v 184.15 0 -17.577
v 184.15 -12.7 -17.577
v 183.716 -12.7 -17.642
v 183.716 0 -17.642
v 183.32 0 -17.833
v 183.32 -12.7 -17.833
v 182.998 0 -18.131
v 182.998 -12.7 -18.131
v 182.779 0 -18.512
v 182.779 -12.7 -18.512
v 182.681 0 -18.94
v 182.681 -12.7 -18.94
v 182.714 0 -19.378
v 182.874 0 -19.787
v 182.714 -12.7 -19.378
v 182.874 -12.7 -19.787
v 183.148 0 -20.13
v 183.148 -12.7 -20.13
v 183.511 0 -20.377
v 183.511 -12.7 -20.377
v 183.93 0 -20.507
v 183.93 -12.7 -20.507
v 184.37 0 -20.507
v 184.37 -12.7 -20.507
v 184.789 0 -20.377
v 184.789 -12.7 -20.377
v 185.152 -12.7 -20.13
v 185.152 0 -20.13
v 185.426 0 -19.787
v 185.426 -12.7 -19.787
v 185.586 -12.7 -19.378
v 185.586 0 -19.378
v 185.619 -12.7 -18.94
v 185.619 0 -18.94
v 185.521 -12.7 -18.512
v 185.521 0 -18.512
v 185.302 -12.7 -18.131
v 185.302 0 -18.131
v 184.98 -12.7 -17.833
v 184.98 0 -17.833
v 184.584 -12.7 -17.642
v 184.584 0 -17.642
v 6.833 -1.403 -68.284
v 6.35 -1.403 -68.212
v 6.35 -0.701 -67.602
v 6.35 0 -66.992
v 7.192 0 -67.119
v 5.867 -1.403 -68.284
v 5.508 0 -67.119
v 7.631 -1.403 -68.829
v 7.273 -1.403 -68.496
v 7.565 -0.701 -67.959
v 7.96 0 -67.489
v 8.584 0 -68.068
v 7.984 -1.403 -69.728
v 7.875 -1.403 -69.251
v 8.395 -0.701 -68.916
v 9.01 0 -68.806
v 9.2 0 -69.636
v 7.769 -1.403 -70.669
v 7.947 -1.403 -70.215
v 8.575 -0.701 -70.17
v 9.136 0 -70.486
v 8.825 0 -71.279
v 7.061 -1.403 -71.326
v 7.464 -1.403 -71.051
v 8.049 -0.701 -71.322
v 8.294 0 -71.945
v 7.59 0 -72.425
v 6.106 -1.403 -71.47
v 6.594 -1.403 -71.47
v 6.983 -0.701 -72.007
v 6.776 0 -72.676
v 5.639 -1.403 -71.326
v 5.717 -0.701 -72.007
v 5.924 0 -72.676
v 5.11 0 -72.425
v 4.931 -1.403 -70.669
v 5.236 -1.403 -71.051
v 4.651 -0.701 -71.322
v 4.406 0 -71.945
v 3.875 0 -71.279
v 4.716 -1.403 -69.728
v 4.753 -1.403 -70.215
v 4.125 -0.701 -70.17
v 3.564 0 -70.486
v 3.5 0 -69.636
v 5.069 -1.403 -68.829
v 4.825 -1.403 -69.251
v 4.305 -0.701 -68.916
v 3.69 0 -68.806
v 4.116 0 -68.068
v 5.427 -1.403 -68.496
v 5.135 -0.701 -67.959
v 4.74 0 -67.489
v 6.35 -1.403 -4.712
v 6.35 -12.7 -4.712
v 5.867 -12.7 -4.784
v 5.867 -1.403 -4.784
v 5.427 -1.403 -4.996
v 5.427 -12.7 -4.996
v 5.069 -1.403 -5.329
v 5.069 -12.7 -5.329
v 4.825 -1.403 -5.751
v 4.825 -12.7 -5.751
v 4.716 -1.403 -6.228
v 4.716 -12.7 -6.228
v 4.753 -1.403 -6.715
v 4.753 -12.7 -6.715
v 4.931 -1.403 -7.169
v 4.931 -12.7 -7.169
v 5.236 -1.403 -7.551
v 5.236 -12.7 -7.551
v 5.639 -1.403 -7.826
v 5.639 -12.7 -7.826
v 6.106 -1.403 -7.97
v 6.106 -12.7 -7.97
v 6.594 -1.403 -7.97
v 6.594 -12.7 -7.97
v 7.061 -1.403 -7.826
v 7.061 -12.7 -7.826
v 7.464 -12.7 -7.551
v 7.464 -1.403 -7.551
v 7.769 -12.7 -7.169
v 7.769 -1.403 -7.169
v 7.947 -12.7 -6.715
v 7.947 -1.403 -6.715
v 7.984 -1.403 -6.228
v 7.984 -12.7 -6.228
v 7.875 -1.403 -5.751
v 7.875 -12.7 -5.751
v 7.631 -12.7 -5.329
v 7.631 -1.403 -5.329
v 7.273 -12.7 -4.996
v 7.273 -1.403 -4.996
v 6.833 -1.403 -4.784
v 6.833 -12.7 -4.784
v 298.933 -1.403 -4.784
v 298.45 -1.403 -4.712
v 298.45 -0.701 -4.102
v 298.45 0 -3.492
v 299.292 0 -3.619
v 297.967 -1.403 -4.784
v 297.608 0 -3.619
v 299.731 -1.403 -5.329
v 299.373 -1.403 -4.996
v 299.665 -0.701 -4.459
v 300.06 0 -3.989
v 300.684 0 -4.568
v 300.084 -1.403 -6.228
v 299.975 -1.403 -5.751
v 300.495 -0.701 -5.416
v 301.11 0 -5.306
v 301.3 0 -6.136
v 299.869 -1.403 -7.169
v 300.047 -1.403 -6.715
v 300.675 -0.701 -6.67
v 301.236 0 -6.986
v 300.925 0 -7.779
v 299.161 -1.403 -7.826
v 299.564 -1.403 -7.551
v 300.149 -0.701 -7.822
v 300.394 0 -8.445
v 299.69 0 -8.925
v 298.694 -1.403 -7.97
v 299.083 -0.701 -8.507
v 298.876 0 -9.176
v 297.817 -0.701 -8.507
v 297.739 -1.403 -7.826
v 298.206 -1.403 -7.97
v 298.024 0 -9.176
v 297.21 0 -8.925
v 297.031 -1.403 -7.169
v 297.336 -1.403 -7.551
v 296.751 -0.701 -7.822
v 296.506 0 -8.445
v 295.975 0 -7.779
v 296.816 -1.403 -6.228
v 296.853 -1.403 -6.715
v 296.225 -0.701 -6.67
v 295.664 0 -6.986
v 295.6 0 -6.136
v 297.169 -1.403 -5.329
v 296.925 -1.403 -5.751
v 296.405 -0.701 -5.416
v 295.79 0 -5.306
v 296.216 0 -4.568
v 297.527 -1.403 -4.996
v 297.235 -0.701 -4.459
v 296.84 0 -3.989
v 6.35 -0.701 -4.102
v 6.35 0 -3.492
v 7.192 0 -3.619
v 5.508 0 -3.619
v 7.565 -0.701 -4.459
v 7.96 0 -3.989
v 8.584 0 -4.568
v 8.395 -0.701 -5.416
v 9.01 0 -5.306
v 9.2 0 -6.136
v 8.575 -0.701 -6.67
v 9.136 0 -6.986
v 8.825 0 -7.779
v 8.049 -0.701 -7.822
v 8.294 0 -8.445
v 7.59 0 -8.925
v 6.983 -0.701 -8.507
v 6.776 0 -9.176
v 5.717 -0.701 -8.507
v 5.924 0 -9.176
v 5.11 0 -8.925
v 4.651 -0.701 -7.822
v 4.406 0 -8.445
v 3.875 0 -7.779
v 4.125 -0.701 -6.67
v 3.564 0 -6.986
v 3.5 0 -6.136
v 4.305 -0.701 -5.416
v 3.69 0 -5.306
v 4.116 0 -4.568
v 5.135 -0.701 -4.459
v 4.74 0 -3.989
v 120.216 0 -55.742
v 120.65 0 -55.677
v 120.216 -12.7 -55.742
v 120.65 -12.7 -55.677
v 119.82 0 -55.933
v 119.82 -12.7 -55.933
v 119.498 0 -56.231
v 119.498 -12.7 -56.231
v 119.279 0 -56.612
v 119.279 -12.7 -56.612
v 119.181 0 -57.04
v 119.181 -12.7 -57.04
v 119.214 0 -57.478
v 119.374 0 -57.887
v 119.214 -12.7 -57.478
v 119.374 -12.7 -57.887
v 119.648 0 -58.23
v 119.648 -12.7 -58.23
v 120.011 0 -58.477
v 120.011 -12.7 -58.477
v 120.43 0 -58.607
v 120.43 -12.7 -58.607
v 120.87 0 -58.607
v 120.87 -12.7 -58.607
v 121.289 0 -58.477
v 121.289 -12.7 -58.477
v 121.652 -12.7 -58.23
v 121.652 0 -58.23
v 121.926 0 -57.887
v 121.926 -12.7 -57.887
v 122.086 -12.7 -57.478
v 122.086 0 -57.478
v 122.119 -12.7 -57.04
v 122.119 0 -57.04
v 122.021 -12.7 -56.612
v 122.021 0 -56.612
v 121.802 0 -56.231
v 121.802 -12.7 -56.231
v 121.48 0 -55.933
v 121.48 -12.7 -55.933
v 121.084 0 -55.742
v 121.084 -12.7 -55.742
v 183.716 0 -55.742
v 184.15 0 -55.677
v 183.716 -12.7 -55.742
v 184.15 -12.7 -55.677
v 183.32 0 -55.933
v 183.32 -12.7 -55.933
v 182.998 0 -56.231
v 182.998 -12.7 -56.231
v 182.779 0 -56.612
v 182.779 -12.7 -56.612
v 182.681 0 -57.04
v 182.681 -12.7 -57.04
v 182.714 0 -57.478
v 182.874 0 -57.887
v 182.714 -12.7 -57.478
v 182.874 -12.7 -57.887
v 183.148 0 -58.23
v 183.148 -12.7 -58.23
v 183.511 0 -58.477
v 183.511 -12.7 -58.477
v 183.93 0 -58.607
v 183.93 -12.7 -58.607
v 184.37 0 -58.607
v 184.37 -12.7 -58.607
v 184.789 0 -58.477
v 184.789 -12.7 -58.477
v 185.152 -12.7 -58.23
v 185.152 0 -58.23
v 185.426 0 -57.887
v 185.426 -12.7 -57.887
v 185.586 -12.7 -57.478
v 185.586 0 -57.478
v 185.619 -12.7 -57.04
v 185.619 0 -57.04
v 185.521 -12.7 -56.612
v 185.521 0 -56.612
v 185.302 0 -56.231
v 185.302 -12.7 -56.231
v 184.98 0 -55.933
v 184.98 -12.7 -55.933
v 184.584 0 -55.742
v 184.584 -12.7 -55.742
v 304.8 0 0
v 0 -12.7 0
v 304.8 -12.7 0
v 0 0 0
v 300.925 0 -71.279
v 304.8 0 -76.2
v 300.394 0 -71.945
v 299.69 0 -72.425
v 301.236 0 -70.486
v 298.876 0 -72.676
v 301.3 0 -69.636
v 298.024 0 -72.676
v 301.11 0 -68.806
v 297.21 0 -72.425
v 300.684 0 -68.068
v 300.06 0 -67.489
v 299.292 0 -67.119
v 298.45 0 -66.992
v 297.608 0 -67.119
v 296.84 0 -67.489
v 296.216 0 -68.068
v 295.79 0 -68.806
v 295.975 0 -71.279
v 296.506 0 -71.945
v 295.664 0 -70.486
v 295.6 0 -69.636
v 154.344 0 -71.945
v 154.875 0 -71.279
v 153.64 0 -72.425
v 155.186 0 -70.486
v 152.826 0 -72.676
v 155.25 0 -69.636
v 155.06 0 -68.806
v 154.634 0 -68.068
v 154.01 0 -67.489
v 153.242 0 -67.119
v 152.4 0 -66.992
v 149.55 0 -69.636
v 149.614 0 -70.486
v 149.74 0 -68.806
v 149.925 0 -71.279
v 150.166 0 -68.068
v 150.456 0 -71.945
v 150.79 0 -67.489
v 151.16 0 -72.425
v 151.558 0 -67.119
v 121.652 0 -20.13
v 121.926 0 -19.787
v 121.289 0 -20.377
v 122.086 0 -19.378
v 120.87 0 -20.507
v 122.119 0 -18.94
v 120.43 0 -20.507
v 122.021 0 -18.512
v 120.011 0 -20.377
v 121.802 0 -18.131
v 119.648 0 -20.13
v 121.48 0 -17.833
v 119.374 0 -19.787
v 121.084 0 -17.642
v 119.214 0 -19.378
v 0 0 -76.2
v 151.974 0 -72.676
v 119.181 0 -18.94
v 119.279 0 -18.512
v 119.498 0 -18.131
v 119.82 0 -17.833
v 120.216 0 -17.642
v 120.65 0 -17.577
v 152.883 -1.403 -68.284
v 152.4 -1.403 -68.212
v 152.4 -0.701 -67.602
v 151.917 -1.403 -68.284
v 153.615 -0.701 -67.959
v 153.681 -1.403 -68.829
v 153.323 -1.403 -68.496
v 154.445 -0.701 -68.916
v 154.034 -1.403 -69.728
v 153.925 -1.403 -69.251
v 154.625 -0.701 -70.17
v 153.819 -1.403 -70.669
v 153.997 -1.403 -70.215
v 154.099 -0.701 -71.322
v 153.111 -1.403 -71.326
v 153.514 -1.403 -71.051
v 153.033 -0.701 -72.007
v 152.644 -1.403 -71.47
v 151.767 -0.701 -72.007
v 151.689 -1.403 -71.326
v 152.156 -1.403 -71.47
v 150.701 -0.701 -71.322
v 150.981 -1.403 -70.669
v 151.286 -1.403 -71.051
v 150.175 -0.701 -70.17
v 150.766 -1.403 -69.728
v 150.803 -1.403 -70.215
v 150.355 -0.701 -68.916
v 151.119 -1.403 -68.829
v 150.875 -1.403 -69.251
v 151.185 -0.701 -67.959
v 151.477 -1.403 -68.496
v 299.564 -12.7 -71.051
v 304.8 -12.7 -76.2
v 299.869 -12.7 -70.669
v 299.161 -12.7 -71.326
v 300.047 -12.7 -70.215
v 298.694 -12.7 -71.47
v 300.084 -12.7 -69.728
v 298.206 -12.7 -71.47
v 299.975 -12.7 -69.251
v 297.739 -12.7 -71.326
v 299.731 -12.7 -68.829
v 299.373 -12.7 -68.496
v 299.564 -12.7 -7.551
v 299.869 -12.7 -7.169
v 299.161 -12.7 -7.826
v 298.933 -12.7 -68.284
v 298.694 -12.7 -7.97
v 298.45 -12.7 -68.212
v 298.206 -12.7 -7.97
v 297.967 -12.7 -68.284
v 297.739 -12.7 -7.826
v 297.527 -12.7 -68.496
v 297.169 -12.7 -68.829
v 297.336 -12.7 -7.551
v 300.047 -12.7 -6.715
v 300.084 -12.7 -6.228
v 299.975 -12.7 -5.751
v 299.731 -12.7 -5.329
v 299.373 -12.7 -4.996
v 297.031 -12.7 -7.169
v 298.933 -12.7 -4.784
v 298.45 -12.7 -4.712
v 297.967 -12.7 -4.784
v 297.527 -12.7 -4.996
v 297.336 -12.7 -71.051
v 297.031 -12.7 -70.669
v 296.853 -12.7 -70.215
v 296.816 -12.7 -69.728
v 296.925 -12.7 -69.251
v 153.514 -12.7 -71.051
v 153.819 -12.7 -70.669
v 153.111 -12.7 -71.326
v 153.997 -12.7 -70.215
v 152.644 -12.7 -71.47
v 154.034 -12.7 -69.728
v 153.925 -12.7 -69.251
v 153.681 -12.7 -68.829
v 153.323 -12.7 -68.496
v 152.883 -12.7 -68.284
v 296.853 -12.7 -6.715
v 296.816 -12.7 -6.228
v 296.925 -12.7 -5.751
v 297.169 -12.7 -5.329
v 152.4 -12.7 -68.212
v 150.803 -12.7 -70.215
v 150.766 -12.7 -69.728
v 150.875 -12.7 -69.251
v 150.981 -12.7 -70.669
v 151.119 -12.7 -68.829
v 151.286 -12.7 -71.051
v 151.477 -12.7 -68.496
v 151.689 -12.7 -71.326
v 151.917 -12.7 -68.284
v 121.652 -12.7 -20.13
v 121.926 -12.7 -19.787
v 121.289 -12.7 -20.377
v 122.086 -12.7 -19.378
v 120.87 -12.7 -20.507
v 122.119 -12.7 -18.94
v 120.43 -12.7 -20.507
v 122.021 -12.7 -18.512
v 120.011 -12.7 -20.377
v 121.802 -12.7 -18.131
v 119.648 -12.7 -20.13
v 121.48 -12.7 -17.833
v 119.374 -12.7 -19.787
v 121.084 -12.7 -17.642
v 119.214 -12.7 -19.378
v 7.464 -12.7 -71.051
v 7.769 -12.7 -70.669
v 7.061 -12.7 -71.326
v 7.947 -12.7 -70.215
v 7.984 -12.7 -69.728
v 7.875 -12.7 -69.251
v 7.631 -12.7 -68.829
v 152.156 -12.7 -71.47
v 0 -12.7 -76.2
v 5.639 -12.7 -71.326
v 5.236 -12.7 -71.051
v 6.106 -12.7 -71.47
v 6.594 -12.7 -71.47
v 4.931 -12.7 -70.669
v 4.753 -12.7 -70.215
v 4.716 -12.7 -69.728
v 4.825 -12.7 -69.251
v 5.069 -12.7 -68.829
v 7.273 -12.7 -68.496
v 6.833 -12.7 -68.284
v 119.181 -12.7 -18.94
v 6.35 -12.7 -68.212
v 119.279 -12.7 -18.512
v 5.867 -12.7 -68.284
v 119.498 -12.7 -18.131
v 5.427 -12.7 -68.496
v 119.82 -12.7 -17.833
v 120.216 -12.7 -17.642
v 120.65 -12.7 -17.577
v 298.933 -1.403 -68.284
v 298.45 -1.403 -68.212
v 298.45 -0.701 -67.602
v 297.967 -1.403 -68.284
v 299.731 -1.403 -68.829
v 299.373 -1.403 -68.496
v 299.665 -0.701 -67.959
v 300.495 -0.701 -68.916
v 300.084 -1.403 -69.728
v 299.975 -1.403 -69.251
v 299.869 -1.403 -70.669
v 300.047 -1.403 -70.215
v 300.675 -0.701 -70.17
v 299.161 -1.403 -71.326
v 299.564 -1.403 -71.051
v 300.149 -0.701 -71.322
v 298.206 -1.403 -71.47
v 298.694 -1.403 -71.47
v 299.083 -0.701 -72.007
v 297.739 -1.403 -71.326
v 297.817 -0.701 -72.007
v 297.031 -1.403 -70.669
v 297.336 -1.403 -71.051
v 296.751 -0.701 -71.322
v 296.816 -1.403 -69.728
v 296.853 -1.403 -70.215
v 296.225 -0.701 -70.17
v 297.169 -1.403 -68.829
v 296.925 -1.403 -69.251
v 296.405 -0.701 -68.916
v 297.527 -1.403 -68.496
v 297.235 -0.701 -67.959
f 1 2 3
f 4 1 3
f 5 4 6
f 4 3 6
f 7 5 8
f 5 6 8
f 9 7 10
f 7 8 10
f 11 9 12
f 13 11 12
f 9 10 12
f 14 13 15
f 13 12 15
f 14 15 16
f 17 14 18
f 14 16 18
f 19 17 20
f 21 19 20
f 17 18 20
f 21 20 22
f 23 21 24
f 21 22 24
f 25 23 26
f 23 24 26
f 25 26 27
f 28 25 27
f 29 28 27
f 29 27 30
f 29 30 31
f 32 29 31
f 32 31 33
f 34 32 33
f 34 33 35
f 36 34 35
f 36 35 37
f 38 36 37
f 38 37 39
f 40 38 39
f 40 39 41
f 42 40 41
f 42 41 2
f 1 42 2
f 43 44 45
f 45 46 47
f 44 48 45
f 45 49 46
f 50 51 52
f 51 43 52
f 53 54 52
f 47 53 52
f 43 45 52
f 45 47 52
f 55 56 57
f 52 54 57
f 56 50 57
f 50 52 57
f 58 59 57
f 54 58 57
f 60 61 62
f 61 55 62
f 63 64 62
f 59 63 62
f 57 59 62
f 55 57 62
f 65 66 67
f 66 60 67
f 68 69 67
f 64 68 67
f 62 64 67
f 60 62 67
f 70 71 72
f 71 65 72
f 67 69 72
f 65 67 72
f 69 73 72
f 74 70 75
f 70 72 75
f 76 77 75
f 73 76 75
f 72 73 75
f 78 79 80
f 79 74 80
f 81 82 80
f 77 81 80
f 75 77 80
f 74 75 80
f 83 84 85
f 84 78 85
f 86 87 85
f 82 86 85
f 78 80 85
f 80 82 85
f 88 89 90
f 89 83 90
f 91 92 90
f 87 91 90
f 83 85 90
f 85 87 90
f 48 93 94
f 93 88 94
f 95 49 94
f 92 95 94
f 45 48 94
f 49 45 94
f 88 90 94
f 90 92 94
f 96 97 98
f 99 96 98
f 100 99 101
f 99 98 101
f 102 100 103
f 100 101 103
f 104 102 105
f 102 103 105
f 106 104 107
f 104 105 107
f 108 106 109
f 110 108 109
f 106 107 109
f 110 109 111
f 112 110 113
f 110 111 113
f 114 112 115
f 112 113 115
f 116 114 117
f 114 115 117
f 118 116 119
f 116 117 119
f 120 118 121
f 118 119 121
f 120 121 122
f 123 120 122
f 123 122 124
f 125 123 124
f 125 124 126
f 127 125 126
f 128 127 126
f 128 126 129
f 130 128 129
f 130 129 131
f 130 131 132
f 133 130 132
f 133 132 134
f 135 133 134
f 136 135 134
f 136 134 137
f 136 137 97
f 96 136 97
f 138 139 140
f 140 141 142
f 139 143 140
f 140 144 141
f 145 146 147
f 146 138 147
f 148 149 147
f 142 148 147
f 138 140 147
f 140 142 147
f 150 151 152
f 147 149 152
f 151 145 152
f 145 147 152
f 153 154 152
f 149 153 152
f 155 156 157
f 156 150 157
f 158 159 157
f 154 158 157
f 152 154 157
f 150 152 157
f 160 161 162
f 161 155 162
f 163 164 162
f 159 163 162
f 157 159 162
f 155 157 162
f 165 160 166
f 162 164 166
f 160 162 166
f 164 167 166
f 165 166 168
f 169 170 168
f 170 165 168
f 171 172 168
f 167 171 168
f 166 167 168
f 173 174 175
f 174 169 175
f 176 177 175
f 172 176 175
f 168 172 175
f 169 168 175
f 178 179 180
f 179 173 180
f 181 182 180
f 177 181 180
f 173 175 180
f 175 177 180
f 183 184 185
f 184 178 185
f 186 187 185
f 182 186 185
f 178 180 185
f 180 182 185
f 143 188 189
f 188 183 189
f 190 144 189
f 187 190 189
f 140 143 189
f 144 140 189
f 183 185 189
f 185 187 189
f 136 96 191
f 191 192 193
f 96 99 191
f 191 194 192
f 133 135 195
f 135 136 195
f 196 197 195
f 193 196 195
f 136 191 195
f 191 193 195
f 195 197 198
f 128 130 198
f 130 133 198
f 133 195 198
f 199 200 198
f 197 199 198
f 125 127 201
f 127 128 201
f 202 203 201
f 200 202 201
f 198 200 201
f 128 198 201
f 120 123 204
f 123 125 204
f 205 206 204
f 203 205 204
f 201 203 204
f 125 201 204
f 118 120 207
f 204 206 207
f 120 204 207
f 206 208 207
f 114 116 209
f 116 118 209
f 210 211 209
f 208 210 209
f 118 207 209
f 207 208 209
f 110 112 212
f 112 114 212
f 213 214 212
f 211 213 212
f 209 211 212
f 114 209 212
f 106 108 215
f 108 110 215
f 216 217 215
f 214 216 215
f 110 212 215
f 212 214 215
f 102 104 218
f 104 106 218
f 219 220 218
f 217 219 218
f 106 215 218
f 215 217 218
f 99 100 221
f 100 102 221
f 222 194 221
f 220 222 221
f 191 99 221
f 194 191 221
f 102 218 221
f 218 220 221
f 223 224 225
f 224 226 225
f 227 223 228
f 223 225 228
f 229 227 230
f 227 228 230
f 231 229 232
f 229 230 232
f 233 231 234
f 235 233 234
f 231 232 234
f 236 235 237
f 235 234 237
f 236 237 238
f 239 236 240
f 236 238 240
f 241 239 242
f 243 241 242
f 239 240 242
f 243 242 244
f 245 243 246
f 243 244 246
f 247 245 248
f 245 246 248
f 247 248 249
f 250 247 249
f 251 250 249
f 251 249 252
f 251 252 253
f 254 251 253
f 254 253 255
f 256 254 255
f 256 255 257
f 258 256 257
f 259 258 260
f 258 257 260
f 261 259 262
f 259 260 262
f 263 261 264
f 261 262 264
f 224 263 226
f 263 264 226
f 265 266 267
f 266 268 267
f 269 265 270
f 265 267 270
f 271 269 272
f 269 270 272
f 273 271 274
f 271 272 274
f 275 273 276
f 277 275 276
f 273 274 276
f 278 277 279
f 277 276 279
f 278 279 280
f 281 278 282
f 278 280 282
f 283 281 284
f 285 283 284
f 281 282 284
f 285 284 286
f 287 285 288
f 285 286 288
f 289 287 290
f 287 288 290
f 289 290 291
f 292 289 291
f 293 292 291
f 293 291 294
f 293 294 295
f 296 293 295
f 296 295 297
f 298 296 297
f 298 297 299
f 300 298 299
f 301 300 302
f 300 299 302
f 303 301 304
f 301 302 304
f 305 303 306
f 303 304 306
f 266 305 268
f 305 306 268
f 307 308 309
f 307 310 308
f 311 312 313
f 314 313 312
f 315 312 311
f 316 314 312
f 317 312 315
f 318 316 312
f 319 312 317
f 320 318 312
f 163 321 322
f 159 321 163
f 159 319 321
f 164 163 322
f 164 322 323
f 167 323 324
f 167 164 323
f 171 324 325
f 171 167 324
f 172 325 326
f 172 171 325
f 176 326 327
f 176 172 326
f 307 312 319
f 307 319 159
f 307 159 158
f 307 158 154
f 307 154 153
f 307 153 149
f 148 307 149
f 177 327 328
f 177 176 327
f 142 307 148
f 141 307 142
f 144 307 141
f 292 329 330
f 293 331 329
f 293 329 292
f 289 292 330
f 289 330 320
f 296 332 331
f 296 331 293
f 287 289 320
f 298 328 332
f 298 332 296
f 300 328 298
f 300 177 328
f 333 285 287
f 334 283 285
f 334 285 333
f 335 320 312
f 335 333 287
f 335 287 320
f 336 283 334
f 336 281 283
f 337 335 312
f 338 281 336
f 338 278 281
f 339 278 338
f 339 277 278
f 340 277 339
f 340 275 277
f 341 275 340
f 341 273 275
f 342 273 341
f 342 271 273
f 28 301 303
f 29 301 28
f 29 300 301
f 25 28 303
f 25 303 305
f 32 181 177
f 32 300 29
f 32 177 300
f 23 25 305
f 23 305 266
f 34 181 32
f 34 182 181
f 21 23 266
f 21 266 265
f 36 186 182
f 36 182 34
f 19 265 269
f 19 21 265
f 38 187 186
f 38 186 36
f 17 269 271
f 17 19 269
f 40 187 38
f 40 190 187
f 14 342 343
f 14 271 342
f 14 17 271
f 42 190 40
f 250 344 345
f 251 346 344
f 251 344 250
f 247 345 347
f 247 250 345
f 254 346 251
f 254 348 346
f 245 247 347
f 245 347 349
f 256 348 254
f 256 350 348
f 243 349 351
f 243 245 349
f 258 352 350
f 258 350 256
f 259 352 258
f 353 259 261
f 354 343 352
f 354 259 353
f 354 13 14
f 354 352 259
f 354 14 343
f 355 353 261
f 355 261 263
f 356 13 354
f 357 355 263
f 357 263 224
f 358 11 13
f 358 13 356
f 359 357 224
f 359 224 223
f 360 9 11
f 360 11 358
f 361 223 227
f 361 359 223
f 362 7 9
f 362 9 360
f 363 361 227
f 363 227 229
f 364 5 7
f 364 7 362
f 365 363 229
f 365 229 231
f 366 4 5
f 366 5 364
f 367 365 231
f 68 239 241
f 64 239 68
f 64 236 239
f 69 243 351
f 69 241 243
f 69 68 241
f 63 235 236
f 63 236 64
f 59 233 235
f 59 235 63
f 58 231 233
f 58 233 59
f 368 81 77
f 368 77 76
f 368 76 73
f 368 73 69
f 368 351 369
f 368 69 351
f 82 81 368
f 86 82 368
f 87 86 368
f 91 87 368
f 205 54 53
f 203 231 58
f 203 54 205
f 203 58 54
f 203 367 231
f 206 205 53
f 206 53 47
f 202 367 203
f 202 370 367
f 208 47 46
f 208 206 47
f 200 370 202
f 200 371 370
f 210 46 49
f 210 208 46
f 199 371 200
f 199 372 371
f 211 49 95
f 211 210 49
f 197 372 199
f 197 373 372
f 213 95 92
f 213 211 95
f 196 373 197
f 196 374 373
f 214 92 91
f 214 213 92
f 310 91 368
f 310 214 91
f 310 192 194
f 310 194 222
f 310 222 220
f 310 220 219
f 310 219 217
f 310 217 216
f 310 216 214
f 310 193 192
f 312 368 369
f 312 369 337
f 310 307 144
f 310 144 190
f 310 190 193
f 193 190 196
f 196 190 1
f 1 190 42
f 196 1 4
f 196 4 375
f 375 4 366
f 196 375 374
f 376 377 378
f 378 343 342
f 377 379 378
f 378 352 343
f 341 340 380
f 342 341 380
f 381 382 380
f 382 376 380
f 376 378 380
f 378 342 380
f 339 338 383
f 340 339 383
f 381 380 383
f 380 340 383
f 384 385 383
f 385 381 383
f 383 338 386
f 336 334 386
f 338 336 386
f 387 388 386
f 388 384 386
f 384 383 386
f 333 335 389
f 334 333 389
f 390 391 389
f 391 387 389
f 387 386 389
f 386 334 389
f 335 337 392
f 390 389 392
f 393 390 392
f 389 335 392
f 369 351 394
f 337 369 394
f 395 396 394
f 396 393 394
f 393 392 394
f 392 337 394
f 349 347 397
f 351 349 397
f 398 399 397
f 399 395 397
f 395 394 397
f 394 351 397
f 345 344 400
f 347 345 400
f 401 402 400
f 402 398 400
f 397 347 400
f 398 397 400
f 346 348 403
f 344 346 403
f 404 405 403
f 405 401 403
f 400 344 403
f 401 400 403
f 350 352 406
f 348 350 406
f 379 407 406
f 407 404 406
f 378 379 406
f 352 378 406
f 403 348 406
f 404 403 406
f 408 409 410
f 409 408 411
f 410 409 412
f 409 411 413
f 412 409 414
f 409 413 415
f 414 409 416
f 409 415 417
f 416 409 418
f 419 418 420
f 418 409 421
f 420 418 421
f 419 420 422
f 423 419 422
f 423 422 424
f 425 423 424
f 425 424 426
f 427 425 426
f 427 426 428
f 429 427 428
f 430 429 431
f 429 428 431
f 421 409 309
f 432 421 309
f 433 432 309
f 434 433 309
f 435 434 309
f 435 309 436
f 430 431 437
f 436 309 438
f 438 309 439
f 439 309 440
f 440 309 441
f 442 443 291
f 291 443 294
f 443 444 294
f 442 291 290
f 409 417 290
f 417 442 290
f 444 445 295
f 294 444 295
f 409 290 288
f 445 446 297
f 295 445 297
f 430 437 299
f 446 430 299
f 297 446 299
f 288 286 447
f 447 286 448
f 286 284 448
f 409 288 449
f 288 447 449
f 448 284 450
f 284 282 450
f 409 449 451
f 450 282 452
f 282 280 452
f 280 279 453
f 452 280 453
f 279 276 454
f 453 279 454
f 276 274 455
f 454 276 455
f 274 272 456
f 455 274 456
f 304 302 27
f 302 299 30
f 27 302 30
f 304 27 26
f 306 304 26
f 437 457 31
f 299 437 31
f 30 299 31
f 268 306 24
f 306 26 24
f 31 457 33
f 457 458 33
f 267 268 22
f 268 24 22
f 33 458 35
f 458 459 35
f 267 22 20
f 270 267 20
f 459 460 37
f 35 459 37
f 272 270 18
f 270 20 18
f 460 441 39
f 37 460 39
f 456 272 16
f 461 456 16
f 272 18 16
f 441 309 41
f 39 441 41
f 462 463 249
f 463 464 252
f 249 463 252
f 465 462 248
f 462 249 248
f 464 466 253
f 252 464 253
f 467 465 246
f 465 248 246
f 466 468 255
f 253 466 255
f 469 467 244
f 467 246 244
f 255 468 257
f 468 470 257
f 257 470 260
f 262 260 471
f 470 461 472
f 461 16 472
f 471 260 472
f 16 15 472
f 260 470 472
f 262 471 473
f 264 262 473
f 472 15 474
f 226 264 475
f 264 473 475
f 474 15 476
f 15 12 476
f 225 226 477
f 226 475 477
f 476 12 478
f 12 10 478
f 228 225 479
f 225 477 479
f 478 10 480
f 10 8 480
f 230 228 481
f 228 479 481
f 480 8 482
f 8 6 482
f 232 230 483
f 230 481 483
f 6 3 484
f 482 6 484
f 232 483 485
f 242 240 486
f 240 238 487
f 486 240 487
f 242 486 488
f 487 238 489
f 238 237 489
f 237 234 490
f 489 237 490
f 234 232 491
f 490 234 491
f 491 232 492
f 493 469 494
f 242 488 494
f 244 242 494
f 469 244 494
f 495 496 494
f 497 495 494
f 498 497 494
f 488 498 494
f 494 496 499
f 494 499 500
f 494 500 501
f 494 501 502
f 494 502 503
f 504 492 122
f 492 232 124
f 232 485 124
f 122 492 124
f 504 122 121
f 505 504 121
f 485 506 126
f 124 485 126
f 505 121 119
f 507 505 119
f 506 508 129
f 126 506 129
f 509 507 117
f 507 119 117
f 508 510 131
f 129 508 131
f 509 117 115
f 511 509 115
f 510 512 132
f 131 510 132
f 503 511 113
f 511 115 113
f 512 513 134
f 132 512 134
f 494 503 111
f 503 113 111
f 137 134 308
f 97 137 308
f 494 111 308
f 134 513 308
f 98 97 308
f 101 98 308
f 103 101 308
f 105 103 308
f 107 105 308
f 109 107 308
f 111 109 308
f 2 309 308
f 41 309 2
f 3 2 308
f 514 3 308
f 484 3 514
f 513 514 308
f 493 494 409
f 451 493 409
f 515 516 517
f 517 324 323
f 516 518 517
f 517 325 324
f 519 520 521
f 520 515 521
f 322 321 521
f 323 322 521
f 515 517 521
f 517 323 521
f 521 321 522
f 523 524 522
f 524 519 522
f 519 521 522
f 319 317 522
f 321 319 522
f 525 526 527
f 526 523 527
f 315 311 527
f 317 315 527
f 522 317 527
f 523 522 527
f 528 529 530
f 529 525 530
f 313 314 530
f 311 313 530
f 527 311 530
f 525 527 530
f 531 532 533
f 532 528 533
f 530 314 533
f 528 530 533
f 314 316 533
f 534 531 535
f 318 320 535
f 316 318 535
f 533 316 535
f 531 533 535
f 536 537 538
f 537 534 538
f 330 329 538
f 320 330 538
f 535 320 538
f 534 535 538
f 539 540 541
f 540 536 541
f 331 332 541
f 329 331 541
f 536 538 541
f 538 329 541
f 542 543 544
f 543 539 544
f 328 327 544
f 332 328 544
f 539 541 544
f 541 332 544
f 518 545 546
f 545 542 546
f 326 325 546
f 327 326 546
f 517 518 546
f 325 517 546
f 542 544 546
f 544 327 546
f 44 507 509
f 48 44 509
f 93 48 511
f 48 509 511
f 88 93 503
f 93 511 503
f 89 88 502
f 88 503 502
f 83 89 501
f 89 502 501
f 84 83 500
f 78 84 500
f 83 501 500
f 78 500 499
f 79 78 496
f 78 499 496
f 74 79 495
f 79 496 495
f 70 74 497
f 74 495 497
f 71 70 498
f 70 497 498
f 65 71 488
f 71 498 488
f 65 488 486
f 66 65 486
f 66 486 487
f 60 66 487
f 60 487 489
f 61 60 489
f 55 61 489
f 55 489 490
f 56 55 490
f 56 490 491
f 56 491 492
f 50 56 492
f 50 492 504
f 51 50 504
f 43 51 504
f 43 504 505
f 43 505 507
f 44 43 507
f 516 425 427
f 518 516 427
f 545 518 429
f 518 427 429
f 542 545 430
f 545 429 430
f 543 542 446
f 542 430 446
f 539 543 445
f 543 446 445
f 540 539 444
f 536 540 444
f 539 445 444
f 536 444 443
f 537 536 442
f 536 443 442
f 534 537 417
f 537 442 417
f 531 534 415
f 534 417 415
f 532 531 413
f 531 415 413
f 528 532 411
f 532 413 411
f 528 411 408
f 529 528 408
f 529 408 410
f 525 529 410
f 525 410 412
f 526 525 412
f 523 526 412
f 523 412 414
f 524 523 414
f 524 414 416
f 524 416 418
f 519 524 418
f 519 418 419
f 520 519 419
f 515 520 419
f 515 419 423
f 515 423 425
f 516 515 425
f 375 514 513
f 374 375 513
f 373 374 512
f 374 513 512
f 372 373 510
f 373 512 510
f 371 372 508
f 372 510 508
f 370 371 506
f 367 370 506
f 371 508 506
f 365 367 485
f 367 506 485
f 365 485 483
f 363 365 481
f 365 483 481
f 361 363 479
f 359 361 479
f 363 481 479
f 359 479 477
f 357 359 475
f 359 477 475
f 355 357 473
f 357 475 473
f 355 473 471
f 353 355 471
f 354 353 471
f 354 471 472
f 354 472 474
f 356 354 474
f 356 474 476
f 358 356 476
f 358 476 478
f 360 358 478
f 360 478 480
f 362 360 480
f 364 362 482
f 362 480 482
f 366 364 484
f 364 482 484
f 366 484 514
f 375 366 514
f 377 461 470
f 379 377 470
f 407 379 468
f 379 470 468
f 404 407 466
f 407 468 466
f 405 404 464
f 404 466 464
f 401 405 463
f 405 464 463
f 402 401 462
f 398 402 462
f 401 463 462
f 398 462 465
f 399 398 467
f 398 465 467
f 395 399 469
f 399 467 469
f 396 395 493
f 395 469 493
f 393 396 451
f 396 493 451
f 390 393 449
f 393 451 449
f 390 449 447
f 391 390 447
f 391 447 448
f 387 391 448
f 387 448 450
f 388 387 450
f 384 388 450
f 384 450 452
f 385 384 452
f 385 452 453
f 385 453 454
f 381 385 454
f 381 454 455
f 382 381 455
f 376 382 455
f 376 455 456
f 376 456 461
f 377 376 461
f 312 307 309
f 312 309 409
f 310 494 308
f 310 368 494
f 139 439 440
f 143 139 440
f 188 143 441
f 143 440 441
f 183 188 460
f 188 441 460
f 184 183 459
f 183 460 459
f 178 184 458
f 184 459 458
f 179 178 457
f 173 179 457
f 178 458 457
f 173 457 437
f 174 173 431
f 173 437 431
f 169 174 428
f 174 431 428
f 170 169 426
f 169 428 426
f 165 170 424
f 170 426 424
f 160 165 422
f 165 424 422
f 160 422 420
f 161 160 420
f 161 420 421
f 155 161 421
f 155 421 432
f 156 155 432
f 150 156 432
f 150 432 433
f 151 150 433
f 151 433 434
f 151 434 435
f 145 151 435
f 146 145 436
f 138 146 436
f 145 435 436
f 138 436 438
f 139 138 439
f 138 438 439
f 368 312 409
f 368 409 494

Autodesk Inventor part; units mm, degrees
ref_plane "YZ Plane" through (0, 0, 0) normal (1, 0, 0) x (0, 1, 0)
ref_plane "XZ Plane" through (0, 0, 0) normal (0, 1, 0) x (-1, 0, 0)
ref_plane "XY Plane" through (0, 0, 0) normal (0, 0, 1) x (1, 0, 0)
sketch "Sketch1" plane through (0, 0, 0) normal (0, 1, 0) x (-1, 0, 0)
  line L0 (0, 0) -> (-304.8, 0)
  line L1 (-304.8, 0) -> (-304.8, -76.2)
  line L2 (-304.8, -76.2) -> (0, -76.2)
  line L3 (0, -76.2) -> (0, 0)
  line L4 (0, -38.1) -> (-304.8, -38.1)
  line L5 (-152.4, -76.2) -> (-152.4, 0)
  point P0 (-6.35, -69.85)
  point P1 (-6.35, -6.35)
  point P2 (-298.45, -69.85)
  point P3 (-298.45, -6.35)
  point P4 (-152.4, -69.85)
  dimension "d0" = 76.2
  dimension "d1" = 304.8
  dimension "d17" = 6.35
  dimension "d18" = 6.35
extrude "Extrusion1" add sketch "Sketch1" against normal blind 12.7
hole "Back Panel Mount Hole" at (6.35, 0, -69.85) direction (0, -1, 0) diameter 3.2766 end through all countersink diameter 5.715 countersink angle 82 clearance for "Flat Head Machine Screw (82)" size "#4" standard "Ansi Unified Screw Threads"
pattern_sketch "Back Panel Mounting Holes" of "Back Panel Mount Hole" from (6.35, 0, -69.85) copies at (6.35, 0, -6.35) at (298.45, 0, -69.85) at (298.45, 0, -6.35) at (152.4, 0, -69.85)
sketch "Name Plate Hole Pattern" plane through (0, 0, 0) normal (0, 1, 0) x (1, 0, 0)
  line L0 (127, 25.4) -> (177.8, 25.4) construction
  line L1 (177.8, 25.4) -> (177.8, 50.8) construction
  line L2 (177.8, 50.8) -> (127, 50.8) construction
  line L3 (127, 50.8) -> (127, 25.4) construction
  line L4 (127, 25.4) -> (177.8, 50.8) construction
  line L5 (177.8, 25.4) -> (127, 50.8) construction
  line L6 (152.4, 76.2) -> (152.4, 0) projected
  line L7 (184.15, 19.05) -> (120.65, 19.05) construction
  line L8 (120.65, 19.05) -> (120.65, 57.15) construction
  line L9 (120.65, 57.15) -> (184.15, 57.15) construction
  line L10 (184.15, 57.15) -> (184.15, 19.05) construction
  point P0 (152.4, 38.1)
  dimension "d19" = 50.8
  dimension "d20" = 25.4
  dimension "d21" = 6.35
hole "Name Plate Mounting Hole" at (120.65, 0, -57.15) direction (0, -1, 0) diameter 2.9464 end through all clearance for "Flat Head Machine Screw (82)" size "#4" standard "Ansi Unified Screw Threads"
pattern_sketch "Name Plate Mounting Holes" of "Name Plate Mounting Hole" from (120.65, 0, -57.15) copies at (184.15, 0, -57.15) at (184.15, 0, -19.05) at (120.65, 0, -19.05)
equation "\"d18\" = d17"
properties material "MDF Medium Density Fiberboard"
